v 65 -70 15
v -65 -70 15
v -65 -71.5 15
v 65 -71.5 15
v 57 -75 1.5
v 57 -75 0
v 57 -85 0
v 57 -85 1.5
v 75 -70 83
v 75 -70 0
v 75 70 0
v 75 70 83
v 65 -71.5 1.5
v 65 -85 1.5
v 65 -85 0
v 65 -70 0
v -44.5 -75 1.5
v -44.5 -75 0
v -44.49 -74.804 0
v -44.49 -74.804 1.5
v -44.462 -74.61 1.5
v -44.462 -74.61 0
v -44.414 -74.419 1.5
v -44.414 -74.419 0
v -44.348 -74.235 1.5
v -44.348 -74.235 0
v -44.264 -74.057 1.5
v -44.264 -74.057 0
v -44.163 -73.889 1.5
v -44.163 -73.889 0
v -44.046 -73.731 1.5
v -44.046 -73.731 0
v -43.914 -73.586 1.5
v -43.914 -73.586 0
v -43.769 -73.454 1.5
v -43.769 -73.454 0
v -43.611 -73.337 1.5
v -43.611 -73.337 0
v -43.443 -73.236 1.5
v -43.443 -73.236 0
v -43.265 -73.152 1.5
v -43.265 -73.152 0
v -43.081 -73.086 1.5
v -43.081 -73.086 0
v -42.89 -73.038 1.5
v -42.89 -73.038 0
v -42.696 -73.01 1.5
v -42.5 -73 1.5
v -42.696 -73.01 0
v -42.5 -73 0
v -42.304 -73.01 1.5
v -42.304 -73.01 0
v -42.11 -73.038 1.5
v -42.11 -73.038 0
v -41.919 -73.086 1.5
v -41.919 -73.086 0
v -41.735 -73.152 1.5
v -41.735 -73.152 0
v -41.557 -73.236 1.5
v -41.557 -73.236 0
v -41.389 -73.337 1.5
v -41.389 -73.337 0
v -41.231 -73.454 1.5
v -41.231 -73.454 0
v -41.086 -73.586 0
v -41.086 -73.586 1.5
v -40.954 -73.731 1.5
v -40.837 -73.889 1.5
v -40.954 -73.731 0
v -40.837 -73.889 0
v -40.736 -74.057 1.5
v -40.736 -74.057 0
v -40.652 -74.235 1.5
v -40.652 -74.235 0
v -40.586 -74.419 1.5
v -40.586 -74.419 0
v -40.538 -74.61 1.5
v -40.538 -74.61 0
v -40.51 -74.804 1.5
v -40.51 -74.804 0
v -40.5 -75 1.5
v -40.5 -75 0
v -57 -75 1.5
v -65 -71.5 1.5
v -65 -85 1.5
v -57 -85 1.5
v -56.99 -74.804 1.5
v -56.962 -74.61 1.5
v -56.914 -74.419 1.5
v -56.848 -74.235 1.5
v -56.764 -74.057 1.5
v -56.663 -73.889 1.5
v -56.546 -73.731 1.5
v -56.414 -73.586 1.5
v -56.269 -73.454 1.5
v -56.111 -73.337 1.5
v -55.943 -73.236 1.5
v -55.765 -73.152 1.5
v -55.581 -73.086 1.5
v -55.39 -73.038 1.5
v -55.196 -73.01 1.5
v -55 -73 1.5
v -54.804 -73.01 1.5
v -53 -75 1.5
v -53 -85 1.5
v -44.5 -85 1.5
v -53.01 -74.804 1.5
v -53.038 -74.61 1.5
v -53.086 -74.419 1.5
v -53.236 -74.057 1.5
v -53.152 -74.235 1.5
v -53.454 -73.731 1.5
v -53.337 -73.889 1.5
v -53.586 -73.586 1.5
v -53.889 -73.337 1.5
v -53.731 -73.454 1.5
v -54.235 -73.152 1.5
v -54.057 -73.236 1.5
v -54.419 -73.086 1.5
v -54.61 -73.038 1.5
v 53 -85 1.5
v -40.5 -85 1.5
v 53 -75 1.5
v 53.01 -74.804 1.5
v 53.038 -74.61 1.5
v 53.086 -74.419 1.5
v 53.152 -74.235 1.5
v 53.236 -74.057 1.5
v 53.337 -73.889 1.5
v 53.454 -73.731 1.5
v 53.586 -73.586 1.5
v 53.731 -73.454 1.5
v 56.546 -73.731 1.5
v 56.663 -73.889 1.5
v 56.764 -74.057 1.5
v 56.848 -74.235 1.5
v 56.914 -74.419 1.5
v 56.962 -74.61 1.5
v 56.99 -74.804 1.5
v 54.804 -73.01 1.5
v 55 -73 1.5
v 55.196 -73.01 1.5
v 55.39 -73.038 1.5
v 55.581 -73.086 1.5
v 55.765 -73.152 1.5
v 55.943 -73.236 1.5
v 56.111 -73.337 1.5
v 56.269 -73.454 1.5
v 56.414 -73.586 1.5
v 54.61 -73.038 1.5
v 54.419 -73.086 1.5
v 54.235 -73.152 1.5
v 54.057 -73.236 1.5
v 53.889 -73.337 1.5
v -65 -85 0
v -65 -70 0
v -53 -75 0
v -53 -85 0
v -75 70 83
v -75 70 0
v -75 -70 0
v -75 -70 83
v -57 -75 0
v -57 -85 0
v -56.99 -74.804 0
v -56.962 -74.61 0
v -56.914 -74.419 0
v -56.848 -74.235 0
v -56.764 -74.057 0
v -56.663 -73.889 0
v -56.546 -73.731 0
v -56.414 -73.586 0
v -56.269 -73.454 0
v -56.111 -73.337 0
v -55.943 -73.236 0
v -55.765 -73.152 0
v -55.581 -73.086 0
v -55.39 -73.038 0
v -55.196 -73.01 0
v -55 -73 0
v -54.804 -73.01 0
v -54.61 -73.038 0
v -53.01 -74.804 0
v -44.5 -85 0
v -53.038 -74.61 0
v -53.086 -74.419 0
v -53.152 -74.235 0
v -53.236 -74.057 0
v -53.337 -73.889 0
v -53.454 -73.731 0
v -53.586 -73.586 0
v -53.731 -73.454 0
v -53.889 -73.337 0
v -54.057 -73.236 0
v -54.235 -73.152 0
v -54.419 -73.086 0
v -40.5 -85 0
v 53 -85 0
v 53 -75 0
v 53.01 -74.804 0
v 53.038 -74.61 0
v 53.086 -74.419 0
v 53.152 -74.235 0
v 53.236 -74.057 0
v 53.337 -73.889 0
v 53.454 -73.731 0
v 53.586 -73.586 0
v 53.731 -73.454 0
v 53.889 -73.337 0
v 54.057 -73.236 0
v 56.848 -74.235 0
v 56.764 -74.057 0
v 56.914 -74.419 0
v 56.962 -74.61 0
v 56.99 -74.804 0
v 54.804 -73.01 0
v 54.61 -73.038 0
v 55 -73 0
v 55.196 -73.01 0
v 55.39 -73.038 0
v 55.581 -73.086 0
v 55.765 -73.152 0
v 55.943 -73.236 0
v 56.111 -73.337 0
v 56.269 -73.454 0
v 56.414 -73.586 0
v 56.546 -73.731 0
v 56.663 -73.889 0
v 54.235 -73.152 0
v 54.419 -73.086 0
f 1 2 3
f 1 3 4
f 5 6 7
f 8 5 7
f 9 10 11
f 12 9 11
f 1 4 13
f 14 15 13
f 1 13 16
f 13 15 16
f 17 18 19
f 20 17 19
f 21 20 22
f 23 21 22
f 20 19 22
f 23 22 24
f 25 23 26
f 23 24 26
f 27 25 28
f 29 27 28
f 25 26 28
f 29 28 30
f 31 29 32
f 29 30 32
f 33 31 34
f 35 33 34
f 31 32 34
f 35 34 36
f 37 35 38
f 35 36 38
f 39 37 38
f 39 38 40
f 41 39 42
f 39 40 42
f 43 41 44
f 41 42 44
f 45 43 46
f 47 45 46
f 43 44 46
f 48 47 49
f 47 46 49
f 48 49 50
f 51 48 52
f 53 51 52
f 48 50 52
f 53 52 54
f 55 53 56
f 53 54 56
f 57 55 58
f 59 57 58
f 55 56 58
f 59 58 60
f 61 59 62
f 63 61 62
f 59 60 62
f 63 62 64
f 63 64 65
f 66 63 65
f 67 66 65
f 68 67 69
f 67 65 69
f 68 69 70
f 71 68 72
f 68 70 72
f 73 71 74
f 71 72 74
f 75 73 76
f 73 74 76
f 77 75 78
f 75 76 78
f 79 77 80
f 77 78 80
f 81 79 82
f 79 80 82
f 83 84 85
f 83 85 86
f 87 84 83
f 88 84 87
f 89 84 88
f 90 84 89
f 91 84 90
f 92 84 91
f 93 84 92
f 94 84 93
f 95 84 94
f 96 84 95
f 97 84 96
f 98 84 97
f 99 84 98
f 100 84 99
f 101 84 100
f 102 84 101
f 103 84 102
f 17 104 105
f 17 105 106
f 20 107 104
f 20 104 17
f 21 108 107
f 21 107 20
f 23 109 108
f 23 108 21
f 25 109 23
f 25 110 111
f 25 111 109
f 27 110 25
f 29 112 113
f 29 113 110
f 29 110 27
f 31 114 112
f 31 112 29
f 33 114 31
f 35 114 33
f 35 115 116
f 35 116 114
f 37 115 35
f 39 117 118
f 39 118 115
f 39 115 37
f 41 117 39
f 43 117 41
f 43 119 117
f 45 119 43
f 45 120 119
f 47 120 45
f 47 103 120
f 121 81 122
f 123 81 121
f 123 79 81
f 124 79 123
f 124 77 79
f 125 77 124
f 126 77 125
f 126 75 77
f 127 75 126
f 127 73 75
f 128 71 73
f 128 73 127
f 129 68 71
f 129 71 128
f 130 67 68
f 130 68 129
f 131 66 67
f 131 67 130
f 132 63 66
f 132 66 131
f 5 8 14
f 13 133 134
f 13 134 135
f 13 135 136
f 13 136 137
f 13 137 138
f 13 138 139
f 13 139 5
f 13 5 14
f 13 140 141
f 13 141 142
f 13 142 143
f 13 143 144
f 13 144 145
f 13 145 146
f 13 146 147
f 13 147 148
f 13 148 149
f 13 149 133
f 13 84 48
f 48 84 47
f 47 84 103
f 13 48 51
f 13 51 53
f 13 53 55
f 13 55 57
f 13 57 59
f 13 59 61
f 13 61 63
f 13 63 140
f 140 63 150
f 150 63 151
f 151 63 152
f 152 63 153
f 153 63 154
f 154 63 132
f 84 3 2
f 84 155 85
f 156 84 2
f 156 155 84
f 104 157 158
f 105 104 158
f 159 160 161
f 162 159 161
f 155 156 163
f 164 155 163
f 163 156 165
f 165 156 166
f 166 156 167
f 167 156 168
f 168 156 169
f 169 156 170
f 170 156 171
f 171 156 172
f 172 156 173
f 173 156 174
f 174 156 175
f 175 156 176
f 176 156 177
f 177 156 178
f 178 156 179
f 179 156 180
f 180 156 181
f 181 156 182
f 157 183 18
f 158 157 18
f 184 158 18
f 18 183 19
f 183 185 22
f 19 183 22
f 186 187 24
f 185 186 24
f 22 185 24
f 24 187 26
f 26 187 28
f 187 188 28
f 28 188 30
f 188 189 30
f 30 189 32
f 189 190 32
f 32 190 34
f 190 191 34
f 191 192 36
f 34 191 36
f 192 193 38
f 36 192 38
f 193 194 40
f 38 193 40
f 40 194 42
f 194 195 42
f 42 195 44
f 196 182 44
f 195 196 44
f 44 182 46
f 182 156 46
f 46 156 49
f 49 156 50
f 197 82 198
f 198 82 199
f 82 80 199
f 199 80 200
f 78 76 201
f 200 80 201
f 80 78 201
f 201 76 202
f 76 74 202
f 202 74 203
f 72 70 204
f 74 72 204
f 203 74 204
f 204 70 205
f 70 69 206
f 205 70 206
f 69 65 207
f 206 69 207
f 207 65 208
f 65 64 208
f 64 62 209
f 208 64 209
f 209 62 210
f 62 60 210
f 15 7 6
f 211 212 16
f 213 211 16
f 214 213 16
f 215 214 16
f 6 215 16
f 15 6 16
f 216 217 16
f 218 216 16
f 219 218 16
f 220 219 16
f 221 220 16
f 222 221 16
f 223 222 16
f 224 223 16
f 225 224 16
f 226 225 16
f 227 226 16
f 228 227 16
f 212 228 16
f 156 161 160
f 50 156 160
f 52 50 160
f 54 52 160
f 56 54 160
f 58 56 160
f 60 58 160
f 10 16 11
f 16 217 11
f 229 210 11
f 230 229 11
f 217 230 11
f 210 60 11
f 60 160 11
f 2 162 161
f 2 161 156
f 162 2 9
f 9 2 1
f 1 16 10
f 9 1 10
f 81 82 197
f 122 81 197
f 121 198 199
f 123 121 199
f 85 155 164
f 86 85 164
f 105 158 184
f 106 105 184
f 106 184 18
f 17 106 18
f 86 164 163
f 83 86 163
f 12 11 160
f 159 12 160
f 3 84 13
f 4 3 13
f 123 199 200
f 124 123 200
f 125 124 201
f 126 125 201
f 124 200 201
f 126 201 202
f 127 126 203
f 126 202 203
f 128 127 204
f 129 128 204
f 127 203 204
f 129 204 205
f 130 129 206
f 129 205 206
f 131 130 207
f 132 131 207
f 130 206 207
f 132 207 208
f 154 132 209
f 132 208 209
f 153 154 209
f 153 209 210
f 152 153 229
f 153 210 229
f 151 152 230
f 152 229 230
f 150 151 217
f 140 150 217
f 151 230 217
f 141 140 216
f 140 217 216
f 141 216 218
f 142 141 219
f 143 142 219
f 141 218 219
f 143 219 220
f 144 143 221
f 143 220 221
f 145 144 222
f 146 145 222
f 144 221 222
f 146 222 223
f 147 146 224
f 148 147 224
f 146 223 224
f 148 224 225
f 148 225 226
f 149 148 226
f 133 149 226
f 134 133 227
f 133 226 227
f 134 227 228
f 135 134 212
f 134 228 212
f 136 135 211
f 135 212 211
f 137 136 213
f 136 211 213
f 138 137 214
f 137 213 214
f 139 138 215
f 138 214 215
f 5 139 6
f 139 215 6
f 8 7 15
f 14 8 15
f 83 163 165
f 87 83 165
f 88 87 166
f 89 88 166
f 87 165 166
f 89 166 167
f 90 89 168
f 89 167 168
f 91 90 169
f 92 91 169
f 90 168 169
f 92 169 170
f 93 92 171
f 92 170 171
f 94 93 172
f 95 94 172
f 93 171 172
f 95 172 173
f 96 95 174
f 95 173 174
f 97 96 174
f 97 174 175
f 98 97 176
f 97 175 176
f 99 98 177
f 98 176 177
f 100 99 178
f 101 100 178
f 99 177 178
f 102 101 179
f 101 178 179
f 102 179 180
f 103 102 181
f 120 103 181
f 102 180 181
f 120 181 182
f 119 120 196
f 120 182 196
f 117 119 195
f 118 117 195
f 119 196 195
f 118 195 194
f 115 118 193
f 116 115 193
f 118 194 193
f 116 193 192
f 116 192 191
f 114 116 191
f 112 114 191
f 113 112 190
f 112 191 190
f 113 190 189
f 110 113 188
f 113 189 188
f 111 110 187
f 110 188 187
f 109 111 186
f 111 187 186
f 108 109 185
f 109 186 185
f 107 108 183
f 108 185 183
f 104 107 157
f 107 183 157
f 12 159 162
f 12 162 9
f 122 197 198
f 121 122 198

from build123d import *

# Parameters (mm, degrees)
F1_DEPTH = 83
F2_DEPTH = 1.5
F0_W     = 130
F0_H     = 1.5
F3_DEPTH = 15


with BuildPart() as f1:
    # F0 (on Top) → F1 (new body)
    with BuildSketch(Plane.XY):
        Polygon((75, -70), (75, 70), (-75, 70), (-75, -70), (-65, -70), (65, -70), align=None)
    extrude(amount=F1_DEPTH)



with BuildPart() as f2:
    # F0 (on Top) → F2 (new body)
    with BuildSketch(Plane.XY):
        with BuildLine():
            Line((65, -85), (65, -71.5))
            Line((65, -71.5), (-65, -71.5))
            Line((-65, -71.5), (-65, -85))
            Line((-65, -85), (-57, -85))
            Line((-57, -85), (-57, -75))
            ThreePointArc((-57, -75), (-55, -73), (-53, -75))
            Line((-53, -75), (-53, -85))
            Line((-53, -85), (-44.5, -85))
            Line((-44.5, -85), (-44.5, -75))
            ThreePointArc((-44.5, -75), (-42.5, -73), (-40.5, -75))
            Line((-40.5, -75), (-40.5, -85))
            Line((-40.5, -85), (53, -85))
            Line((53, -85), (53, -75))
            ThreePointArc((53, -75), (55, -73), (57, -75))
            Line((57, -75), (57, -85))
            Line((57, -85), (65, -85))
        make_face()
    extrude(amount=F2_DEPTH)


with BuildPart() as f1_1:
    add(f1.part)

    add(f2.part)  # F3 merges F2
    # F0 (on Top) → F3 (join)
    with BuildSketch(Plane.XY):
        with Locations((0, -70.75)):
            Rectangle(F0_W, F0_H)
    extrude(amount=F3_DEPTH)


solid = f1_1.part
